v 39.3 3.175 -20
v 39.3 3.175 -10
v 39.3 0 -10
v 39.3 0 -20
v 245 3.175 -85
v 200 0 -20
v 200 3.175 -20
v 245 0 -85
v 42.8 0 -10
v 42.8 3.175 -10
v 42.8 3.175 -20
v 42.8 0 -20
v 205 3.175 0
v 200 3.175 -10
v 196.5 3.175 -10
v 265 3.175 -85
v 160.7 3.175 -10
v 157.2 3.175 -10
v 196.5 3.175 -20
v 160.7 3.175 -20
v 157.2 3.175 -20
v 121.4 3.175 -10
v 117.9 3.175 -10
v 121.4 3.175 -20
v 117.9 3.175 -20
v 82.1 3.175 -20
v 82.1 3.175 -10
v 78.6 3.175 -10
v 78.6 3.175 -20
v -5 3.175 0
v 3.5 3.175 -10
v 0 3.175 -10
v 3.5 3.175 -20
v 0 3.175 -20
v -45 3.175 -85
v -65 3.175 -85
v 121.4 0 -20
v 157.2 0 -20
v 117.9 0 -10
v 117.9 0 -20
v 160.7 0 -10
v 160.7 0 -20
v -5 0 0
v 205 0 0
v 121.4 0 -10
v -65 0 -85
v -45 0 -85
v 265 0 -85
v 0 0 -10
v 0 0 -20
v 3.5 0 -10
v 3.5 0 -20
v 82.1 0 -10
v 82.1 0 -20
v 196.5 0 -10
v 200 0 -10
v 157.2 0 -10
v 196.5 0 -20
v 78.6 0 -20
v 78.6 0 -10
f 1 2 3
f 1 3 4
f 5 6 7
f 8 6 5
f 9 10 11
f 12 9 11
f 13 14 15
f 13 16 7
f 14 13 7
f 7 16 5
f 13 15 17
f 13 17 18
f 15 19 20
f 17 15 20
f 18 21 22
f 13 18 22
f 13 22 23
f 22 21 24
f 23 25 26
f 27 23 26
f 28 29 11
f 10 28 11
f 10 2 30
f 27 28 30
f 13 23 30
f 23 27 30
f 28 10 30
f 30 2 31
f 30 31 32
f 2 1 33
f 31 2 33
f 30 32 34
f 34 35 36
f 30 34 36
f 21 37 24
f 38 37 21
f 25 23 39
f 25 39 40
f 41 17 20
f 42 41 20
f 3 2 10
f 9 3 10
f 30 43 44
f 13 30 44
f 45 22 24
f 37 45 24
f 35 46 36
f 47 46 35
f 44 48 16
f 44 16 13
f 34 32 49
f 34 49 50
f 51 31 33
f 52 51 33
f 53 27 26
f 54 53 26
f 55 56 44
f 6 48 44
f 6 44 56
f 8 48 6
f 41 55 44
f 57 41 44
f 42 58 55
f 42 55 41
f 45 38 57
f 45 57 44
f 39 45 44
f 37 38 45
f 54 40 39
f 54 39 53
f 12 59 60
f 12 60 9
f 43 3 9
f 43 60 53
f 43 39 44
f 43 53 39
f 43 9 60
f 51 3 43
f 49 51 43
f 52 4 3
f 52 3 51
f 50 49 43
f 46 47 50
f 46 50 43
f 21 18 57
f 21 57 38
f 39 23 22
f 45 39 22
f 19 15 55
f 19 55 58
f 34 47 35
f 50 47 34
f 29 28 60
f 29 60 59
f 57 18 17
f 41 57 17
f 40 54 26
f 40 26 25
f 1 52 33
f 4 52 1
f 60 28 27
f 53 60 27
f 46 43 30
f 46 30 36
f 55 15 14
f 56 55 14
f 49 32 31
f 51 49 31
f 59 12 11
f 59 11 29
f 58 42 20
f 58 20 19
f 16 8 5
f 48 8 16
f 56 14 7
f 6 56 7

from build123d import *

# Parameters (mm, degrees)
BOSS_EXTRUDE1_DEPTH = 3.175
SKETCH3_W           = 3.5
SKETCH3_H           = 10
CUT_EXTRUDE1_DEPTH  = 4.175


with BuildPart() as part:
    # Sketch2 → Boss-Extrude1 (new body)
    with BuildSketch(Plane(origin=(0, 0, 0), x_dir=(1, 0, 0), z_dir=(0, 1, 0))):
        Polygon((0, 0), (-5, 0), (-65, 85), (-45, 85), (0, 20), (200, 20), (245, 85), (265, 85), (205, 0), (200, 0), align=None)
    extrude(amount=BOSS_EXTRUDE1_DEPTH)

    # Sketch3 → Cut-Extrude1 (cut, through all)
    with BuildSketch(Plane(origin=(0, 3.175, 0), x_dir=(1, 0, 0), z_dir=(0, 1, 0))):
        with Locations((41.05, 15)):
            Rectangle(SKETCH3_W, SKETCH3_H)
        with Locations((1.75, 15)):
            Rectangle(SKETCH3_W, SKETCH3_H)
        with Locations((80.35, 15)):
            Rectangle(SKETCH3_W, SKETCH3_H)
        with Locations((119.65, 15)):
            Rectangle(SKETCH3_W, SKETCH3_H)
        with Locations((158.95, 15)):
            Rectangle(SKETCH3_W, SKETCH3_H)
        with Locations((198.25, 15)):
            Rectangle(SKETCH3_W, SKETCH3_H)
    extrude(amount=-CUT_EXTRUDE1_DEPTH, mode=Mode.SUBTRACT)


solid = part.part
